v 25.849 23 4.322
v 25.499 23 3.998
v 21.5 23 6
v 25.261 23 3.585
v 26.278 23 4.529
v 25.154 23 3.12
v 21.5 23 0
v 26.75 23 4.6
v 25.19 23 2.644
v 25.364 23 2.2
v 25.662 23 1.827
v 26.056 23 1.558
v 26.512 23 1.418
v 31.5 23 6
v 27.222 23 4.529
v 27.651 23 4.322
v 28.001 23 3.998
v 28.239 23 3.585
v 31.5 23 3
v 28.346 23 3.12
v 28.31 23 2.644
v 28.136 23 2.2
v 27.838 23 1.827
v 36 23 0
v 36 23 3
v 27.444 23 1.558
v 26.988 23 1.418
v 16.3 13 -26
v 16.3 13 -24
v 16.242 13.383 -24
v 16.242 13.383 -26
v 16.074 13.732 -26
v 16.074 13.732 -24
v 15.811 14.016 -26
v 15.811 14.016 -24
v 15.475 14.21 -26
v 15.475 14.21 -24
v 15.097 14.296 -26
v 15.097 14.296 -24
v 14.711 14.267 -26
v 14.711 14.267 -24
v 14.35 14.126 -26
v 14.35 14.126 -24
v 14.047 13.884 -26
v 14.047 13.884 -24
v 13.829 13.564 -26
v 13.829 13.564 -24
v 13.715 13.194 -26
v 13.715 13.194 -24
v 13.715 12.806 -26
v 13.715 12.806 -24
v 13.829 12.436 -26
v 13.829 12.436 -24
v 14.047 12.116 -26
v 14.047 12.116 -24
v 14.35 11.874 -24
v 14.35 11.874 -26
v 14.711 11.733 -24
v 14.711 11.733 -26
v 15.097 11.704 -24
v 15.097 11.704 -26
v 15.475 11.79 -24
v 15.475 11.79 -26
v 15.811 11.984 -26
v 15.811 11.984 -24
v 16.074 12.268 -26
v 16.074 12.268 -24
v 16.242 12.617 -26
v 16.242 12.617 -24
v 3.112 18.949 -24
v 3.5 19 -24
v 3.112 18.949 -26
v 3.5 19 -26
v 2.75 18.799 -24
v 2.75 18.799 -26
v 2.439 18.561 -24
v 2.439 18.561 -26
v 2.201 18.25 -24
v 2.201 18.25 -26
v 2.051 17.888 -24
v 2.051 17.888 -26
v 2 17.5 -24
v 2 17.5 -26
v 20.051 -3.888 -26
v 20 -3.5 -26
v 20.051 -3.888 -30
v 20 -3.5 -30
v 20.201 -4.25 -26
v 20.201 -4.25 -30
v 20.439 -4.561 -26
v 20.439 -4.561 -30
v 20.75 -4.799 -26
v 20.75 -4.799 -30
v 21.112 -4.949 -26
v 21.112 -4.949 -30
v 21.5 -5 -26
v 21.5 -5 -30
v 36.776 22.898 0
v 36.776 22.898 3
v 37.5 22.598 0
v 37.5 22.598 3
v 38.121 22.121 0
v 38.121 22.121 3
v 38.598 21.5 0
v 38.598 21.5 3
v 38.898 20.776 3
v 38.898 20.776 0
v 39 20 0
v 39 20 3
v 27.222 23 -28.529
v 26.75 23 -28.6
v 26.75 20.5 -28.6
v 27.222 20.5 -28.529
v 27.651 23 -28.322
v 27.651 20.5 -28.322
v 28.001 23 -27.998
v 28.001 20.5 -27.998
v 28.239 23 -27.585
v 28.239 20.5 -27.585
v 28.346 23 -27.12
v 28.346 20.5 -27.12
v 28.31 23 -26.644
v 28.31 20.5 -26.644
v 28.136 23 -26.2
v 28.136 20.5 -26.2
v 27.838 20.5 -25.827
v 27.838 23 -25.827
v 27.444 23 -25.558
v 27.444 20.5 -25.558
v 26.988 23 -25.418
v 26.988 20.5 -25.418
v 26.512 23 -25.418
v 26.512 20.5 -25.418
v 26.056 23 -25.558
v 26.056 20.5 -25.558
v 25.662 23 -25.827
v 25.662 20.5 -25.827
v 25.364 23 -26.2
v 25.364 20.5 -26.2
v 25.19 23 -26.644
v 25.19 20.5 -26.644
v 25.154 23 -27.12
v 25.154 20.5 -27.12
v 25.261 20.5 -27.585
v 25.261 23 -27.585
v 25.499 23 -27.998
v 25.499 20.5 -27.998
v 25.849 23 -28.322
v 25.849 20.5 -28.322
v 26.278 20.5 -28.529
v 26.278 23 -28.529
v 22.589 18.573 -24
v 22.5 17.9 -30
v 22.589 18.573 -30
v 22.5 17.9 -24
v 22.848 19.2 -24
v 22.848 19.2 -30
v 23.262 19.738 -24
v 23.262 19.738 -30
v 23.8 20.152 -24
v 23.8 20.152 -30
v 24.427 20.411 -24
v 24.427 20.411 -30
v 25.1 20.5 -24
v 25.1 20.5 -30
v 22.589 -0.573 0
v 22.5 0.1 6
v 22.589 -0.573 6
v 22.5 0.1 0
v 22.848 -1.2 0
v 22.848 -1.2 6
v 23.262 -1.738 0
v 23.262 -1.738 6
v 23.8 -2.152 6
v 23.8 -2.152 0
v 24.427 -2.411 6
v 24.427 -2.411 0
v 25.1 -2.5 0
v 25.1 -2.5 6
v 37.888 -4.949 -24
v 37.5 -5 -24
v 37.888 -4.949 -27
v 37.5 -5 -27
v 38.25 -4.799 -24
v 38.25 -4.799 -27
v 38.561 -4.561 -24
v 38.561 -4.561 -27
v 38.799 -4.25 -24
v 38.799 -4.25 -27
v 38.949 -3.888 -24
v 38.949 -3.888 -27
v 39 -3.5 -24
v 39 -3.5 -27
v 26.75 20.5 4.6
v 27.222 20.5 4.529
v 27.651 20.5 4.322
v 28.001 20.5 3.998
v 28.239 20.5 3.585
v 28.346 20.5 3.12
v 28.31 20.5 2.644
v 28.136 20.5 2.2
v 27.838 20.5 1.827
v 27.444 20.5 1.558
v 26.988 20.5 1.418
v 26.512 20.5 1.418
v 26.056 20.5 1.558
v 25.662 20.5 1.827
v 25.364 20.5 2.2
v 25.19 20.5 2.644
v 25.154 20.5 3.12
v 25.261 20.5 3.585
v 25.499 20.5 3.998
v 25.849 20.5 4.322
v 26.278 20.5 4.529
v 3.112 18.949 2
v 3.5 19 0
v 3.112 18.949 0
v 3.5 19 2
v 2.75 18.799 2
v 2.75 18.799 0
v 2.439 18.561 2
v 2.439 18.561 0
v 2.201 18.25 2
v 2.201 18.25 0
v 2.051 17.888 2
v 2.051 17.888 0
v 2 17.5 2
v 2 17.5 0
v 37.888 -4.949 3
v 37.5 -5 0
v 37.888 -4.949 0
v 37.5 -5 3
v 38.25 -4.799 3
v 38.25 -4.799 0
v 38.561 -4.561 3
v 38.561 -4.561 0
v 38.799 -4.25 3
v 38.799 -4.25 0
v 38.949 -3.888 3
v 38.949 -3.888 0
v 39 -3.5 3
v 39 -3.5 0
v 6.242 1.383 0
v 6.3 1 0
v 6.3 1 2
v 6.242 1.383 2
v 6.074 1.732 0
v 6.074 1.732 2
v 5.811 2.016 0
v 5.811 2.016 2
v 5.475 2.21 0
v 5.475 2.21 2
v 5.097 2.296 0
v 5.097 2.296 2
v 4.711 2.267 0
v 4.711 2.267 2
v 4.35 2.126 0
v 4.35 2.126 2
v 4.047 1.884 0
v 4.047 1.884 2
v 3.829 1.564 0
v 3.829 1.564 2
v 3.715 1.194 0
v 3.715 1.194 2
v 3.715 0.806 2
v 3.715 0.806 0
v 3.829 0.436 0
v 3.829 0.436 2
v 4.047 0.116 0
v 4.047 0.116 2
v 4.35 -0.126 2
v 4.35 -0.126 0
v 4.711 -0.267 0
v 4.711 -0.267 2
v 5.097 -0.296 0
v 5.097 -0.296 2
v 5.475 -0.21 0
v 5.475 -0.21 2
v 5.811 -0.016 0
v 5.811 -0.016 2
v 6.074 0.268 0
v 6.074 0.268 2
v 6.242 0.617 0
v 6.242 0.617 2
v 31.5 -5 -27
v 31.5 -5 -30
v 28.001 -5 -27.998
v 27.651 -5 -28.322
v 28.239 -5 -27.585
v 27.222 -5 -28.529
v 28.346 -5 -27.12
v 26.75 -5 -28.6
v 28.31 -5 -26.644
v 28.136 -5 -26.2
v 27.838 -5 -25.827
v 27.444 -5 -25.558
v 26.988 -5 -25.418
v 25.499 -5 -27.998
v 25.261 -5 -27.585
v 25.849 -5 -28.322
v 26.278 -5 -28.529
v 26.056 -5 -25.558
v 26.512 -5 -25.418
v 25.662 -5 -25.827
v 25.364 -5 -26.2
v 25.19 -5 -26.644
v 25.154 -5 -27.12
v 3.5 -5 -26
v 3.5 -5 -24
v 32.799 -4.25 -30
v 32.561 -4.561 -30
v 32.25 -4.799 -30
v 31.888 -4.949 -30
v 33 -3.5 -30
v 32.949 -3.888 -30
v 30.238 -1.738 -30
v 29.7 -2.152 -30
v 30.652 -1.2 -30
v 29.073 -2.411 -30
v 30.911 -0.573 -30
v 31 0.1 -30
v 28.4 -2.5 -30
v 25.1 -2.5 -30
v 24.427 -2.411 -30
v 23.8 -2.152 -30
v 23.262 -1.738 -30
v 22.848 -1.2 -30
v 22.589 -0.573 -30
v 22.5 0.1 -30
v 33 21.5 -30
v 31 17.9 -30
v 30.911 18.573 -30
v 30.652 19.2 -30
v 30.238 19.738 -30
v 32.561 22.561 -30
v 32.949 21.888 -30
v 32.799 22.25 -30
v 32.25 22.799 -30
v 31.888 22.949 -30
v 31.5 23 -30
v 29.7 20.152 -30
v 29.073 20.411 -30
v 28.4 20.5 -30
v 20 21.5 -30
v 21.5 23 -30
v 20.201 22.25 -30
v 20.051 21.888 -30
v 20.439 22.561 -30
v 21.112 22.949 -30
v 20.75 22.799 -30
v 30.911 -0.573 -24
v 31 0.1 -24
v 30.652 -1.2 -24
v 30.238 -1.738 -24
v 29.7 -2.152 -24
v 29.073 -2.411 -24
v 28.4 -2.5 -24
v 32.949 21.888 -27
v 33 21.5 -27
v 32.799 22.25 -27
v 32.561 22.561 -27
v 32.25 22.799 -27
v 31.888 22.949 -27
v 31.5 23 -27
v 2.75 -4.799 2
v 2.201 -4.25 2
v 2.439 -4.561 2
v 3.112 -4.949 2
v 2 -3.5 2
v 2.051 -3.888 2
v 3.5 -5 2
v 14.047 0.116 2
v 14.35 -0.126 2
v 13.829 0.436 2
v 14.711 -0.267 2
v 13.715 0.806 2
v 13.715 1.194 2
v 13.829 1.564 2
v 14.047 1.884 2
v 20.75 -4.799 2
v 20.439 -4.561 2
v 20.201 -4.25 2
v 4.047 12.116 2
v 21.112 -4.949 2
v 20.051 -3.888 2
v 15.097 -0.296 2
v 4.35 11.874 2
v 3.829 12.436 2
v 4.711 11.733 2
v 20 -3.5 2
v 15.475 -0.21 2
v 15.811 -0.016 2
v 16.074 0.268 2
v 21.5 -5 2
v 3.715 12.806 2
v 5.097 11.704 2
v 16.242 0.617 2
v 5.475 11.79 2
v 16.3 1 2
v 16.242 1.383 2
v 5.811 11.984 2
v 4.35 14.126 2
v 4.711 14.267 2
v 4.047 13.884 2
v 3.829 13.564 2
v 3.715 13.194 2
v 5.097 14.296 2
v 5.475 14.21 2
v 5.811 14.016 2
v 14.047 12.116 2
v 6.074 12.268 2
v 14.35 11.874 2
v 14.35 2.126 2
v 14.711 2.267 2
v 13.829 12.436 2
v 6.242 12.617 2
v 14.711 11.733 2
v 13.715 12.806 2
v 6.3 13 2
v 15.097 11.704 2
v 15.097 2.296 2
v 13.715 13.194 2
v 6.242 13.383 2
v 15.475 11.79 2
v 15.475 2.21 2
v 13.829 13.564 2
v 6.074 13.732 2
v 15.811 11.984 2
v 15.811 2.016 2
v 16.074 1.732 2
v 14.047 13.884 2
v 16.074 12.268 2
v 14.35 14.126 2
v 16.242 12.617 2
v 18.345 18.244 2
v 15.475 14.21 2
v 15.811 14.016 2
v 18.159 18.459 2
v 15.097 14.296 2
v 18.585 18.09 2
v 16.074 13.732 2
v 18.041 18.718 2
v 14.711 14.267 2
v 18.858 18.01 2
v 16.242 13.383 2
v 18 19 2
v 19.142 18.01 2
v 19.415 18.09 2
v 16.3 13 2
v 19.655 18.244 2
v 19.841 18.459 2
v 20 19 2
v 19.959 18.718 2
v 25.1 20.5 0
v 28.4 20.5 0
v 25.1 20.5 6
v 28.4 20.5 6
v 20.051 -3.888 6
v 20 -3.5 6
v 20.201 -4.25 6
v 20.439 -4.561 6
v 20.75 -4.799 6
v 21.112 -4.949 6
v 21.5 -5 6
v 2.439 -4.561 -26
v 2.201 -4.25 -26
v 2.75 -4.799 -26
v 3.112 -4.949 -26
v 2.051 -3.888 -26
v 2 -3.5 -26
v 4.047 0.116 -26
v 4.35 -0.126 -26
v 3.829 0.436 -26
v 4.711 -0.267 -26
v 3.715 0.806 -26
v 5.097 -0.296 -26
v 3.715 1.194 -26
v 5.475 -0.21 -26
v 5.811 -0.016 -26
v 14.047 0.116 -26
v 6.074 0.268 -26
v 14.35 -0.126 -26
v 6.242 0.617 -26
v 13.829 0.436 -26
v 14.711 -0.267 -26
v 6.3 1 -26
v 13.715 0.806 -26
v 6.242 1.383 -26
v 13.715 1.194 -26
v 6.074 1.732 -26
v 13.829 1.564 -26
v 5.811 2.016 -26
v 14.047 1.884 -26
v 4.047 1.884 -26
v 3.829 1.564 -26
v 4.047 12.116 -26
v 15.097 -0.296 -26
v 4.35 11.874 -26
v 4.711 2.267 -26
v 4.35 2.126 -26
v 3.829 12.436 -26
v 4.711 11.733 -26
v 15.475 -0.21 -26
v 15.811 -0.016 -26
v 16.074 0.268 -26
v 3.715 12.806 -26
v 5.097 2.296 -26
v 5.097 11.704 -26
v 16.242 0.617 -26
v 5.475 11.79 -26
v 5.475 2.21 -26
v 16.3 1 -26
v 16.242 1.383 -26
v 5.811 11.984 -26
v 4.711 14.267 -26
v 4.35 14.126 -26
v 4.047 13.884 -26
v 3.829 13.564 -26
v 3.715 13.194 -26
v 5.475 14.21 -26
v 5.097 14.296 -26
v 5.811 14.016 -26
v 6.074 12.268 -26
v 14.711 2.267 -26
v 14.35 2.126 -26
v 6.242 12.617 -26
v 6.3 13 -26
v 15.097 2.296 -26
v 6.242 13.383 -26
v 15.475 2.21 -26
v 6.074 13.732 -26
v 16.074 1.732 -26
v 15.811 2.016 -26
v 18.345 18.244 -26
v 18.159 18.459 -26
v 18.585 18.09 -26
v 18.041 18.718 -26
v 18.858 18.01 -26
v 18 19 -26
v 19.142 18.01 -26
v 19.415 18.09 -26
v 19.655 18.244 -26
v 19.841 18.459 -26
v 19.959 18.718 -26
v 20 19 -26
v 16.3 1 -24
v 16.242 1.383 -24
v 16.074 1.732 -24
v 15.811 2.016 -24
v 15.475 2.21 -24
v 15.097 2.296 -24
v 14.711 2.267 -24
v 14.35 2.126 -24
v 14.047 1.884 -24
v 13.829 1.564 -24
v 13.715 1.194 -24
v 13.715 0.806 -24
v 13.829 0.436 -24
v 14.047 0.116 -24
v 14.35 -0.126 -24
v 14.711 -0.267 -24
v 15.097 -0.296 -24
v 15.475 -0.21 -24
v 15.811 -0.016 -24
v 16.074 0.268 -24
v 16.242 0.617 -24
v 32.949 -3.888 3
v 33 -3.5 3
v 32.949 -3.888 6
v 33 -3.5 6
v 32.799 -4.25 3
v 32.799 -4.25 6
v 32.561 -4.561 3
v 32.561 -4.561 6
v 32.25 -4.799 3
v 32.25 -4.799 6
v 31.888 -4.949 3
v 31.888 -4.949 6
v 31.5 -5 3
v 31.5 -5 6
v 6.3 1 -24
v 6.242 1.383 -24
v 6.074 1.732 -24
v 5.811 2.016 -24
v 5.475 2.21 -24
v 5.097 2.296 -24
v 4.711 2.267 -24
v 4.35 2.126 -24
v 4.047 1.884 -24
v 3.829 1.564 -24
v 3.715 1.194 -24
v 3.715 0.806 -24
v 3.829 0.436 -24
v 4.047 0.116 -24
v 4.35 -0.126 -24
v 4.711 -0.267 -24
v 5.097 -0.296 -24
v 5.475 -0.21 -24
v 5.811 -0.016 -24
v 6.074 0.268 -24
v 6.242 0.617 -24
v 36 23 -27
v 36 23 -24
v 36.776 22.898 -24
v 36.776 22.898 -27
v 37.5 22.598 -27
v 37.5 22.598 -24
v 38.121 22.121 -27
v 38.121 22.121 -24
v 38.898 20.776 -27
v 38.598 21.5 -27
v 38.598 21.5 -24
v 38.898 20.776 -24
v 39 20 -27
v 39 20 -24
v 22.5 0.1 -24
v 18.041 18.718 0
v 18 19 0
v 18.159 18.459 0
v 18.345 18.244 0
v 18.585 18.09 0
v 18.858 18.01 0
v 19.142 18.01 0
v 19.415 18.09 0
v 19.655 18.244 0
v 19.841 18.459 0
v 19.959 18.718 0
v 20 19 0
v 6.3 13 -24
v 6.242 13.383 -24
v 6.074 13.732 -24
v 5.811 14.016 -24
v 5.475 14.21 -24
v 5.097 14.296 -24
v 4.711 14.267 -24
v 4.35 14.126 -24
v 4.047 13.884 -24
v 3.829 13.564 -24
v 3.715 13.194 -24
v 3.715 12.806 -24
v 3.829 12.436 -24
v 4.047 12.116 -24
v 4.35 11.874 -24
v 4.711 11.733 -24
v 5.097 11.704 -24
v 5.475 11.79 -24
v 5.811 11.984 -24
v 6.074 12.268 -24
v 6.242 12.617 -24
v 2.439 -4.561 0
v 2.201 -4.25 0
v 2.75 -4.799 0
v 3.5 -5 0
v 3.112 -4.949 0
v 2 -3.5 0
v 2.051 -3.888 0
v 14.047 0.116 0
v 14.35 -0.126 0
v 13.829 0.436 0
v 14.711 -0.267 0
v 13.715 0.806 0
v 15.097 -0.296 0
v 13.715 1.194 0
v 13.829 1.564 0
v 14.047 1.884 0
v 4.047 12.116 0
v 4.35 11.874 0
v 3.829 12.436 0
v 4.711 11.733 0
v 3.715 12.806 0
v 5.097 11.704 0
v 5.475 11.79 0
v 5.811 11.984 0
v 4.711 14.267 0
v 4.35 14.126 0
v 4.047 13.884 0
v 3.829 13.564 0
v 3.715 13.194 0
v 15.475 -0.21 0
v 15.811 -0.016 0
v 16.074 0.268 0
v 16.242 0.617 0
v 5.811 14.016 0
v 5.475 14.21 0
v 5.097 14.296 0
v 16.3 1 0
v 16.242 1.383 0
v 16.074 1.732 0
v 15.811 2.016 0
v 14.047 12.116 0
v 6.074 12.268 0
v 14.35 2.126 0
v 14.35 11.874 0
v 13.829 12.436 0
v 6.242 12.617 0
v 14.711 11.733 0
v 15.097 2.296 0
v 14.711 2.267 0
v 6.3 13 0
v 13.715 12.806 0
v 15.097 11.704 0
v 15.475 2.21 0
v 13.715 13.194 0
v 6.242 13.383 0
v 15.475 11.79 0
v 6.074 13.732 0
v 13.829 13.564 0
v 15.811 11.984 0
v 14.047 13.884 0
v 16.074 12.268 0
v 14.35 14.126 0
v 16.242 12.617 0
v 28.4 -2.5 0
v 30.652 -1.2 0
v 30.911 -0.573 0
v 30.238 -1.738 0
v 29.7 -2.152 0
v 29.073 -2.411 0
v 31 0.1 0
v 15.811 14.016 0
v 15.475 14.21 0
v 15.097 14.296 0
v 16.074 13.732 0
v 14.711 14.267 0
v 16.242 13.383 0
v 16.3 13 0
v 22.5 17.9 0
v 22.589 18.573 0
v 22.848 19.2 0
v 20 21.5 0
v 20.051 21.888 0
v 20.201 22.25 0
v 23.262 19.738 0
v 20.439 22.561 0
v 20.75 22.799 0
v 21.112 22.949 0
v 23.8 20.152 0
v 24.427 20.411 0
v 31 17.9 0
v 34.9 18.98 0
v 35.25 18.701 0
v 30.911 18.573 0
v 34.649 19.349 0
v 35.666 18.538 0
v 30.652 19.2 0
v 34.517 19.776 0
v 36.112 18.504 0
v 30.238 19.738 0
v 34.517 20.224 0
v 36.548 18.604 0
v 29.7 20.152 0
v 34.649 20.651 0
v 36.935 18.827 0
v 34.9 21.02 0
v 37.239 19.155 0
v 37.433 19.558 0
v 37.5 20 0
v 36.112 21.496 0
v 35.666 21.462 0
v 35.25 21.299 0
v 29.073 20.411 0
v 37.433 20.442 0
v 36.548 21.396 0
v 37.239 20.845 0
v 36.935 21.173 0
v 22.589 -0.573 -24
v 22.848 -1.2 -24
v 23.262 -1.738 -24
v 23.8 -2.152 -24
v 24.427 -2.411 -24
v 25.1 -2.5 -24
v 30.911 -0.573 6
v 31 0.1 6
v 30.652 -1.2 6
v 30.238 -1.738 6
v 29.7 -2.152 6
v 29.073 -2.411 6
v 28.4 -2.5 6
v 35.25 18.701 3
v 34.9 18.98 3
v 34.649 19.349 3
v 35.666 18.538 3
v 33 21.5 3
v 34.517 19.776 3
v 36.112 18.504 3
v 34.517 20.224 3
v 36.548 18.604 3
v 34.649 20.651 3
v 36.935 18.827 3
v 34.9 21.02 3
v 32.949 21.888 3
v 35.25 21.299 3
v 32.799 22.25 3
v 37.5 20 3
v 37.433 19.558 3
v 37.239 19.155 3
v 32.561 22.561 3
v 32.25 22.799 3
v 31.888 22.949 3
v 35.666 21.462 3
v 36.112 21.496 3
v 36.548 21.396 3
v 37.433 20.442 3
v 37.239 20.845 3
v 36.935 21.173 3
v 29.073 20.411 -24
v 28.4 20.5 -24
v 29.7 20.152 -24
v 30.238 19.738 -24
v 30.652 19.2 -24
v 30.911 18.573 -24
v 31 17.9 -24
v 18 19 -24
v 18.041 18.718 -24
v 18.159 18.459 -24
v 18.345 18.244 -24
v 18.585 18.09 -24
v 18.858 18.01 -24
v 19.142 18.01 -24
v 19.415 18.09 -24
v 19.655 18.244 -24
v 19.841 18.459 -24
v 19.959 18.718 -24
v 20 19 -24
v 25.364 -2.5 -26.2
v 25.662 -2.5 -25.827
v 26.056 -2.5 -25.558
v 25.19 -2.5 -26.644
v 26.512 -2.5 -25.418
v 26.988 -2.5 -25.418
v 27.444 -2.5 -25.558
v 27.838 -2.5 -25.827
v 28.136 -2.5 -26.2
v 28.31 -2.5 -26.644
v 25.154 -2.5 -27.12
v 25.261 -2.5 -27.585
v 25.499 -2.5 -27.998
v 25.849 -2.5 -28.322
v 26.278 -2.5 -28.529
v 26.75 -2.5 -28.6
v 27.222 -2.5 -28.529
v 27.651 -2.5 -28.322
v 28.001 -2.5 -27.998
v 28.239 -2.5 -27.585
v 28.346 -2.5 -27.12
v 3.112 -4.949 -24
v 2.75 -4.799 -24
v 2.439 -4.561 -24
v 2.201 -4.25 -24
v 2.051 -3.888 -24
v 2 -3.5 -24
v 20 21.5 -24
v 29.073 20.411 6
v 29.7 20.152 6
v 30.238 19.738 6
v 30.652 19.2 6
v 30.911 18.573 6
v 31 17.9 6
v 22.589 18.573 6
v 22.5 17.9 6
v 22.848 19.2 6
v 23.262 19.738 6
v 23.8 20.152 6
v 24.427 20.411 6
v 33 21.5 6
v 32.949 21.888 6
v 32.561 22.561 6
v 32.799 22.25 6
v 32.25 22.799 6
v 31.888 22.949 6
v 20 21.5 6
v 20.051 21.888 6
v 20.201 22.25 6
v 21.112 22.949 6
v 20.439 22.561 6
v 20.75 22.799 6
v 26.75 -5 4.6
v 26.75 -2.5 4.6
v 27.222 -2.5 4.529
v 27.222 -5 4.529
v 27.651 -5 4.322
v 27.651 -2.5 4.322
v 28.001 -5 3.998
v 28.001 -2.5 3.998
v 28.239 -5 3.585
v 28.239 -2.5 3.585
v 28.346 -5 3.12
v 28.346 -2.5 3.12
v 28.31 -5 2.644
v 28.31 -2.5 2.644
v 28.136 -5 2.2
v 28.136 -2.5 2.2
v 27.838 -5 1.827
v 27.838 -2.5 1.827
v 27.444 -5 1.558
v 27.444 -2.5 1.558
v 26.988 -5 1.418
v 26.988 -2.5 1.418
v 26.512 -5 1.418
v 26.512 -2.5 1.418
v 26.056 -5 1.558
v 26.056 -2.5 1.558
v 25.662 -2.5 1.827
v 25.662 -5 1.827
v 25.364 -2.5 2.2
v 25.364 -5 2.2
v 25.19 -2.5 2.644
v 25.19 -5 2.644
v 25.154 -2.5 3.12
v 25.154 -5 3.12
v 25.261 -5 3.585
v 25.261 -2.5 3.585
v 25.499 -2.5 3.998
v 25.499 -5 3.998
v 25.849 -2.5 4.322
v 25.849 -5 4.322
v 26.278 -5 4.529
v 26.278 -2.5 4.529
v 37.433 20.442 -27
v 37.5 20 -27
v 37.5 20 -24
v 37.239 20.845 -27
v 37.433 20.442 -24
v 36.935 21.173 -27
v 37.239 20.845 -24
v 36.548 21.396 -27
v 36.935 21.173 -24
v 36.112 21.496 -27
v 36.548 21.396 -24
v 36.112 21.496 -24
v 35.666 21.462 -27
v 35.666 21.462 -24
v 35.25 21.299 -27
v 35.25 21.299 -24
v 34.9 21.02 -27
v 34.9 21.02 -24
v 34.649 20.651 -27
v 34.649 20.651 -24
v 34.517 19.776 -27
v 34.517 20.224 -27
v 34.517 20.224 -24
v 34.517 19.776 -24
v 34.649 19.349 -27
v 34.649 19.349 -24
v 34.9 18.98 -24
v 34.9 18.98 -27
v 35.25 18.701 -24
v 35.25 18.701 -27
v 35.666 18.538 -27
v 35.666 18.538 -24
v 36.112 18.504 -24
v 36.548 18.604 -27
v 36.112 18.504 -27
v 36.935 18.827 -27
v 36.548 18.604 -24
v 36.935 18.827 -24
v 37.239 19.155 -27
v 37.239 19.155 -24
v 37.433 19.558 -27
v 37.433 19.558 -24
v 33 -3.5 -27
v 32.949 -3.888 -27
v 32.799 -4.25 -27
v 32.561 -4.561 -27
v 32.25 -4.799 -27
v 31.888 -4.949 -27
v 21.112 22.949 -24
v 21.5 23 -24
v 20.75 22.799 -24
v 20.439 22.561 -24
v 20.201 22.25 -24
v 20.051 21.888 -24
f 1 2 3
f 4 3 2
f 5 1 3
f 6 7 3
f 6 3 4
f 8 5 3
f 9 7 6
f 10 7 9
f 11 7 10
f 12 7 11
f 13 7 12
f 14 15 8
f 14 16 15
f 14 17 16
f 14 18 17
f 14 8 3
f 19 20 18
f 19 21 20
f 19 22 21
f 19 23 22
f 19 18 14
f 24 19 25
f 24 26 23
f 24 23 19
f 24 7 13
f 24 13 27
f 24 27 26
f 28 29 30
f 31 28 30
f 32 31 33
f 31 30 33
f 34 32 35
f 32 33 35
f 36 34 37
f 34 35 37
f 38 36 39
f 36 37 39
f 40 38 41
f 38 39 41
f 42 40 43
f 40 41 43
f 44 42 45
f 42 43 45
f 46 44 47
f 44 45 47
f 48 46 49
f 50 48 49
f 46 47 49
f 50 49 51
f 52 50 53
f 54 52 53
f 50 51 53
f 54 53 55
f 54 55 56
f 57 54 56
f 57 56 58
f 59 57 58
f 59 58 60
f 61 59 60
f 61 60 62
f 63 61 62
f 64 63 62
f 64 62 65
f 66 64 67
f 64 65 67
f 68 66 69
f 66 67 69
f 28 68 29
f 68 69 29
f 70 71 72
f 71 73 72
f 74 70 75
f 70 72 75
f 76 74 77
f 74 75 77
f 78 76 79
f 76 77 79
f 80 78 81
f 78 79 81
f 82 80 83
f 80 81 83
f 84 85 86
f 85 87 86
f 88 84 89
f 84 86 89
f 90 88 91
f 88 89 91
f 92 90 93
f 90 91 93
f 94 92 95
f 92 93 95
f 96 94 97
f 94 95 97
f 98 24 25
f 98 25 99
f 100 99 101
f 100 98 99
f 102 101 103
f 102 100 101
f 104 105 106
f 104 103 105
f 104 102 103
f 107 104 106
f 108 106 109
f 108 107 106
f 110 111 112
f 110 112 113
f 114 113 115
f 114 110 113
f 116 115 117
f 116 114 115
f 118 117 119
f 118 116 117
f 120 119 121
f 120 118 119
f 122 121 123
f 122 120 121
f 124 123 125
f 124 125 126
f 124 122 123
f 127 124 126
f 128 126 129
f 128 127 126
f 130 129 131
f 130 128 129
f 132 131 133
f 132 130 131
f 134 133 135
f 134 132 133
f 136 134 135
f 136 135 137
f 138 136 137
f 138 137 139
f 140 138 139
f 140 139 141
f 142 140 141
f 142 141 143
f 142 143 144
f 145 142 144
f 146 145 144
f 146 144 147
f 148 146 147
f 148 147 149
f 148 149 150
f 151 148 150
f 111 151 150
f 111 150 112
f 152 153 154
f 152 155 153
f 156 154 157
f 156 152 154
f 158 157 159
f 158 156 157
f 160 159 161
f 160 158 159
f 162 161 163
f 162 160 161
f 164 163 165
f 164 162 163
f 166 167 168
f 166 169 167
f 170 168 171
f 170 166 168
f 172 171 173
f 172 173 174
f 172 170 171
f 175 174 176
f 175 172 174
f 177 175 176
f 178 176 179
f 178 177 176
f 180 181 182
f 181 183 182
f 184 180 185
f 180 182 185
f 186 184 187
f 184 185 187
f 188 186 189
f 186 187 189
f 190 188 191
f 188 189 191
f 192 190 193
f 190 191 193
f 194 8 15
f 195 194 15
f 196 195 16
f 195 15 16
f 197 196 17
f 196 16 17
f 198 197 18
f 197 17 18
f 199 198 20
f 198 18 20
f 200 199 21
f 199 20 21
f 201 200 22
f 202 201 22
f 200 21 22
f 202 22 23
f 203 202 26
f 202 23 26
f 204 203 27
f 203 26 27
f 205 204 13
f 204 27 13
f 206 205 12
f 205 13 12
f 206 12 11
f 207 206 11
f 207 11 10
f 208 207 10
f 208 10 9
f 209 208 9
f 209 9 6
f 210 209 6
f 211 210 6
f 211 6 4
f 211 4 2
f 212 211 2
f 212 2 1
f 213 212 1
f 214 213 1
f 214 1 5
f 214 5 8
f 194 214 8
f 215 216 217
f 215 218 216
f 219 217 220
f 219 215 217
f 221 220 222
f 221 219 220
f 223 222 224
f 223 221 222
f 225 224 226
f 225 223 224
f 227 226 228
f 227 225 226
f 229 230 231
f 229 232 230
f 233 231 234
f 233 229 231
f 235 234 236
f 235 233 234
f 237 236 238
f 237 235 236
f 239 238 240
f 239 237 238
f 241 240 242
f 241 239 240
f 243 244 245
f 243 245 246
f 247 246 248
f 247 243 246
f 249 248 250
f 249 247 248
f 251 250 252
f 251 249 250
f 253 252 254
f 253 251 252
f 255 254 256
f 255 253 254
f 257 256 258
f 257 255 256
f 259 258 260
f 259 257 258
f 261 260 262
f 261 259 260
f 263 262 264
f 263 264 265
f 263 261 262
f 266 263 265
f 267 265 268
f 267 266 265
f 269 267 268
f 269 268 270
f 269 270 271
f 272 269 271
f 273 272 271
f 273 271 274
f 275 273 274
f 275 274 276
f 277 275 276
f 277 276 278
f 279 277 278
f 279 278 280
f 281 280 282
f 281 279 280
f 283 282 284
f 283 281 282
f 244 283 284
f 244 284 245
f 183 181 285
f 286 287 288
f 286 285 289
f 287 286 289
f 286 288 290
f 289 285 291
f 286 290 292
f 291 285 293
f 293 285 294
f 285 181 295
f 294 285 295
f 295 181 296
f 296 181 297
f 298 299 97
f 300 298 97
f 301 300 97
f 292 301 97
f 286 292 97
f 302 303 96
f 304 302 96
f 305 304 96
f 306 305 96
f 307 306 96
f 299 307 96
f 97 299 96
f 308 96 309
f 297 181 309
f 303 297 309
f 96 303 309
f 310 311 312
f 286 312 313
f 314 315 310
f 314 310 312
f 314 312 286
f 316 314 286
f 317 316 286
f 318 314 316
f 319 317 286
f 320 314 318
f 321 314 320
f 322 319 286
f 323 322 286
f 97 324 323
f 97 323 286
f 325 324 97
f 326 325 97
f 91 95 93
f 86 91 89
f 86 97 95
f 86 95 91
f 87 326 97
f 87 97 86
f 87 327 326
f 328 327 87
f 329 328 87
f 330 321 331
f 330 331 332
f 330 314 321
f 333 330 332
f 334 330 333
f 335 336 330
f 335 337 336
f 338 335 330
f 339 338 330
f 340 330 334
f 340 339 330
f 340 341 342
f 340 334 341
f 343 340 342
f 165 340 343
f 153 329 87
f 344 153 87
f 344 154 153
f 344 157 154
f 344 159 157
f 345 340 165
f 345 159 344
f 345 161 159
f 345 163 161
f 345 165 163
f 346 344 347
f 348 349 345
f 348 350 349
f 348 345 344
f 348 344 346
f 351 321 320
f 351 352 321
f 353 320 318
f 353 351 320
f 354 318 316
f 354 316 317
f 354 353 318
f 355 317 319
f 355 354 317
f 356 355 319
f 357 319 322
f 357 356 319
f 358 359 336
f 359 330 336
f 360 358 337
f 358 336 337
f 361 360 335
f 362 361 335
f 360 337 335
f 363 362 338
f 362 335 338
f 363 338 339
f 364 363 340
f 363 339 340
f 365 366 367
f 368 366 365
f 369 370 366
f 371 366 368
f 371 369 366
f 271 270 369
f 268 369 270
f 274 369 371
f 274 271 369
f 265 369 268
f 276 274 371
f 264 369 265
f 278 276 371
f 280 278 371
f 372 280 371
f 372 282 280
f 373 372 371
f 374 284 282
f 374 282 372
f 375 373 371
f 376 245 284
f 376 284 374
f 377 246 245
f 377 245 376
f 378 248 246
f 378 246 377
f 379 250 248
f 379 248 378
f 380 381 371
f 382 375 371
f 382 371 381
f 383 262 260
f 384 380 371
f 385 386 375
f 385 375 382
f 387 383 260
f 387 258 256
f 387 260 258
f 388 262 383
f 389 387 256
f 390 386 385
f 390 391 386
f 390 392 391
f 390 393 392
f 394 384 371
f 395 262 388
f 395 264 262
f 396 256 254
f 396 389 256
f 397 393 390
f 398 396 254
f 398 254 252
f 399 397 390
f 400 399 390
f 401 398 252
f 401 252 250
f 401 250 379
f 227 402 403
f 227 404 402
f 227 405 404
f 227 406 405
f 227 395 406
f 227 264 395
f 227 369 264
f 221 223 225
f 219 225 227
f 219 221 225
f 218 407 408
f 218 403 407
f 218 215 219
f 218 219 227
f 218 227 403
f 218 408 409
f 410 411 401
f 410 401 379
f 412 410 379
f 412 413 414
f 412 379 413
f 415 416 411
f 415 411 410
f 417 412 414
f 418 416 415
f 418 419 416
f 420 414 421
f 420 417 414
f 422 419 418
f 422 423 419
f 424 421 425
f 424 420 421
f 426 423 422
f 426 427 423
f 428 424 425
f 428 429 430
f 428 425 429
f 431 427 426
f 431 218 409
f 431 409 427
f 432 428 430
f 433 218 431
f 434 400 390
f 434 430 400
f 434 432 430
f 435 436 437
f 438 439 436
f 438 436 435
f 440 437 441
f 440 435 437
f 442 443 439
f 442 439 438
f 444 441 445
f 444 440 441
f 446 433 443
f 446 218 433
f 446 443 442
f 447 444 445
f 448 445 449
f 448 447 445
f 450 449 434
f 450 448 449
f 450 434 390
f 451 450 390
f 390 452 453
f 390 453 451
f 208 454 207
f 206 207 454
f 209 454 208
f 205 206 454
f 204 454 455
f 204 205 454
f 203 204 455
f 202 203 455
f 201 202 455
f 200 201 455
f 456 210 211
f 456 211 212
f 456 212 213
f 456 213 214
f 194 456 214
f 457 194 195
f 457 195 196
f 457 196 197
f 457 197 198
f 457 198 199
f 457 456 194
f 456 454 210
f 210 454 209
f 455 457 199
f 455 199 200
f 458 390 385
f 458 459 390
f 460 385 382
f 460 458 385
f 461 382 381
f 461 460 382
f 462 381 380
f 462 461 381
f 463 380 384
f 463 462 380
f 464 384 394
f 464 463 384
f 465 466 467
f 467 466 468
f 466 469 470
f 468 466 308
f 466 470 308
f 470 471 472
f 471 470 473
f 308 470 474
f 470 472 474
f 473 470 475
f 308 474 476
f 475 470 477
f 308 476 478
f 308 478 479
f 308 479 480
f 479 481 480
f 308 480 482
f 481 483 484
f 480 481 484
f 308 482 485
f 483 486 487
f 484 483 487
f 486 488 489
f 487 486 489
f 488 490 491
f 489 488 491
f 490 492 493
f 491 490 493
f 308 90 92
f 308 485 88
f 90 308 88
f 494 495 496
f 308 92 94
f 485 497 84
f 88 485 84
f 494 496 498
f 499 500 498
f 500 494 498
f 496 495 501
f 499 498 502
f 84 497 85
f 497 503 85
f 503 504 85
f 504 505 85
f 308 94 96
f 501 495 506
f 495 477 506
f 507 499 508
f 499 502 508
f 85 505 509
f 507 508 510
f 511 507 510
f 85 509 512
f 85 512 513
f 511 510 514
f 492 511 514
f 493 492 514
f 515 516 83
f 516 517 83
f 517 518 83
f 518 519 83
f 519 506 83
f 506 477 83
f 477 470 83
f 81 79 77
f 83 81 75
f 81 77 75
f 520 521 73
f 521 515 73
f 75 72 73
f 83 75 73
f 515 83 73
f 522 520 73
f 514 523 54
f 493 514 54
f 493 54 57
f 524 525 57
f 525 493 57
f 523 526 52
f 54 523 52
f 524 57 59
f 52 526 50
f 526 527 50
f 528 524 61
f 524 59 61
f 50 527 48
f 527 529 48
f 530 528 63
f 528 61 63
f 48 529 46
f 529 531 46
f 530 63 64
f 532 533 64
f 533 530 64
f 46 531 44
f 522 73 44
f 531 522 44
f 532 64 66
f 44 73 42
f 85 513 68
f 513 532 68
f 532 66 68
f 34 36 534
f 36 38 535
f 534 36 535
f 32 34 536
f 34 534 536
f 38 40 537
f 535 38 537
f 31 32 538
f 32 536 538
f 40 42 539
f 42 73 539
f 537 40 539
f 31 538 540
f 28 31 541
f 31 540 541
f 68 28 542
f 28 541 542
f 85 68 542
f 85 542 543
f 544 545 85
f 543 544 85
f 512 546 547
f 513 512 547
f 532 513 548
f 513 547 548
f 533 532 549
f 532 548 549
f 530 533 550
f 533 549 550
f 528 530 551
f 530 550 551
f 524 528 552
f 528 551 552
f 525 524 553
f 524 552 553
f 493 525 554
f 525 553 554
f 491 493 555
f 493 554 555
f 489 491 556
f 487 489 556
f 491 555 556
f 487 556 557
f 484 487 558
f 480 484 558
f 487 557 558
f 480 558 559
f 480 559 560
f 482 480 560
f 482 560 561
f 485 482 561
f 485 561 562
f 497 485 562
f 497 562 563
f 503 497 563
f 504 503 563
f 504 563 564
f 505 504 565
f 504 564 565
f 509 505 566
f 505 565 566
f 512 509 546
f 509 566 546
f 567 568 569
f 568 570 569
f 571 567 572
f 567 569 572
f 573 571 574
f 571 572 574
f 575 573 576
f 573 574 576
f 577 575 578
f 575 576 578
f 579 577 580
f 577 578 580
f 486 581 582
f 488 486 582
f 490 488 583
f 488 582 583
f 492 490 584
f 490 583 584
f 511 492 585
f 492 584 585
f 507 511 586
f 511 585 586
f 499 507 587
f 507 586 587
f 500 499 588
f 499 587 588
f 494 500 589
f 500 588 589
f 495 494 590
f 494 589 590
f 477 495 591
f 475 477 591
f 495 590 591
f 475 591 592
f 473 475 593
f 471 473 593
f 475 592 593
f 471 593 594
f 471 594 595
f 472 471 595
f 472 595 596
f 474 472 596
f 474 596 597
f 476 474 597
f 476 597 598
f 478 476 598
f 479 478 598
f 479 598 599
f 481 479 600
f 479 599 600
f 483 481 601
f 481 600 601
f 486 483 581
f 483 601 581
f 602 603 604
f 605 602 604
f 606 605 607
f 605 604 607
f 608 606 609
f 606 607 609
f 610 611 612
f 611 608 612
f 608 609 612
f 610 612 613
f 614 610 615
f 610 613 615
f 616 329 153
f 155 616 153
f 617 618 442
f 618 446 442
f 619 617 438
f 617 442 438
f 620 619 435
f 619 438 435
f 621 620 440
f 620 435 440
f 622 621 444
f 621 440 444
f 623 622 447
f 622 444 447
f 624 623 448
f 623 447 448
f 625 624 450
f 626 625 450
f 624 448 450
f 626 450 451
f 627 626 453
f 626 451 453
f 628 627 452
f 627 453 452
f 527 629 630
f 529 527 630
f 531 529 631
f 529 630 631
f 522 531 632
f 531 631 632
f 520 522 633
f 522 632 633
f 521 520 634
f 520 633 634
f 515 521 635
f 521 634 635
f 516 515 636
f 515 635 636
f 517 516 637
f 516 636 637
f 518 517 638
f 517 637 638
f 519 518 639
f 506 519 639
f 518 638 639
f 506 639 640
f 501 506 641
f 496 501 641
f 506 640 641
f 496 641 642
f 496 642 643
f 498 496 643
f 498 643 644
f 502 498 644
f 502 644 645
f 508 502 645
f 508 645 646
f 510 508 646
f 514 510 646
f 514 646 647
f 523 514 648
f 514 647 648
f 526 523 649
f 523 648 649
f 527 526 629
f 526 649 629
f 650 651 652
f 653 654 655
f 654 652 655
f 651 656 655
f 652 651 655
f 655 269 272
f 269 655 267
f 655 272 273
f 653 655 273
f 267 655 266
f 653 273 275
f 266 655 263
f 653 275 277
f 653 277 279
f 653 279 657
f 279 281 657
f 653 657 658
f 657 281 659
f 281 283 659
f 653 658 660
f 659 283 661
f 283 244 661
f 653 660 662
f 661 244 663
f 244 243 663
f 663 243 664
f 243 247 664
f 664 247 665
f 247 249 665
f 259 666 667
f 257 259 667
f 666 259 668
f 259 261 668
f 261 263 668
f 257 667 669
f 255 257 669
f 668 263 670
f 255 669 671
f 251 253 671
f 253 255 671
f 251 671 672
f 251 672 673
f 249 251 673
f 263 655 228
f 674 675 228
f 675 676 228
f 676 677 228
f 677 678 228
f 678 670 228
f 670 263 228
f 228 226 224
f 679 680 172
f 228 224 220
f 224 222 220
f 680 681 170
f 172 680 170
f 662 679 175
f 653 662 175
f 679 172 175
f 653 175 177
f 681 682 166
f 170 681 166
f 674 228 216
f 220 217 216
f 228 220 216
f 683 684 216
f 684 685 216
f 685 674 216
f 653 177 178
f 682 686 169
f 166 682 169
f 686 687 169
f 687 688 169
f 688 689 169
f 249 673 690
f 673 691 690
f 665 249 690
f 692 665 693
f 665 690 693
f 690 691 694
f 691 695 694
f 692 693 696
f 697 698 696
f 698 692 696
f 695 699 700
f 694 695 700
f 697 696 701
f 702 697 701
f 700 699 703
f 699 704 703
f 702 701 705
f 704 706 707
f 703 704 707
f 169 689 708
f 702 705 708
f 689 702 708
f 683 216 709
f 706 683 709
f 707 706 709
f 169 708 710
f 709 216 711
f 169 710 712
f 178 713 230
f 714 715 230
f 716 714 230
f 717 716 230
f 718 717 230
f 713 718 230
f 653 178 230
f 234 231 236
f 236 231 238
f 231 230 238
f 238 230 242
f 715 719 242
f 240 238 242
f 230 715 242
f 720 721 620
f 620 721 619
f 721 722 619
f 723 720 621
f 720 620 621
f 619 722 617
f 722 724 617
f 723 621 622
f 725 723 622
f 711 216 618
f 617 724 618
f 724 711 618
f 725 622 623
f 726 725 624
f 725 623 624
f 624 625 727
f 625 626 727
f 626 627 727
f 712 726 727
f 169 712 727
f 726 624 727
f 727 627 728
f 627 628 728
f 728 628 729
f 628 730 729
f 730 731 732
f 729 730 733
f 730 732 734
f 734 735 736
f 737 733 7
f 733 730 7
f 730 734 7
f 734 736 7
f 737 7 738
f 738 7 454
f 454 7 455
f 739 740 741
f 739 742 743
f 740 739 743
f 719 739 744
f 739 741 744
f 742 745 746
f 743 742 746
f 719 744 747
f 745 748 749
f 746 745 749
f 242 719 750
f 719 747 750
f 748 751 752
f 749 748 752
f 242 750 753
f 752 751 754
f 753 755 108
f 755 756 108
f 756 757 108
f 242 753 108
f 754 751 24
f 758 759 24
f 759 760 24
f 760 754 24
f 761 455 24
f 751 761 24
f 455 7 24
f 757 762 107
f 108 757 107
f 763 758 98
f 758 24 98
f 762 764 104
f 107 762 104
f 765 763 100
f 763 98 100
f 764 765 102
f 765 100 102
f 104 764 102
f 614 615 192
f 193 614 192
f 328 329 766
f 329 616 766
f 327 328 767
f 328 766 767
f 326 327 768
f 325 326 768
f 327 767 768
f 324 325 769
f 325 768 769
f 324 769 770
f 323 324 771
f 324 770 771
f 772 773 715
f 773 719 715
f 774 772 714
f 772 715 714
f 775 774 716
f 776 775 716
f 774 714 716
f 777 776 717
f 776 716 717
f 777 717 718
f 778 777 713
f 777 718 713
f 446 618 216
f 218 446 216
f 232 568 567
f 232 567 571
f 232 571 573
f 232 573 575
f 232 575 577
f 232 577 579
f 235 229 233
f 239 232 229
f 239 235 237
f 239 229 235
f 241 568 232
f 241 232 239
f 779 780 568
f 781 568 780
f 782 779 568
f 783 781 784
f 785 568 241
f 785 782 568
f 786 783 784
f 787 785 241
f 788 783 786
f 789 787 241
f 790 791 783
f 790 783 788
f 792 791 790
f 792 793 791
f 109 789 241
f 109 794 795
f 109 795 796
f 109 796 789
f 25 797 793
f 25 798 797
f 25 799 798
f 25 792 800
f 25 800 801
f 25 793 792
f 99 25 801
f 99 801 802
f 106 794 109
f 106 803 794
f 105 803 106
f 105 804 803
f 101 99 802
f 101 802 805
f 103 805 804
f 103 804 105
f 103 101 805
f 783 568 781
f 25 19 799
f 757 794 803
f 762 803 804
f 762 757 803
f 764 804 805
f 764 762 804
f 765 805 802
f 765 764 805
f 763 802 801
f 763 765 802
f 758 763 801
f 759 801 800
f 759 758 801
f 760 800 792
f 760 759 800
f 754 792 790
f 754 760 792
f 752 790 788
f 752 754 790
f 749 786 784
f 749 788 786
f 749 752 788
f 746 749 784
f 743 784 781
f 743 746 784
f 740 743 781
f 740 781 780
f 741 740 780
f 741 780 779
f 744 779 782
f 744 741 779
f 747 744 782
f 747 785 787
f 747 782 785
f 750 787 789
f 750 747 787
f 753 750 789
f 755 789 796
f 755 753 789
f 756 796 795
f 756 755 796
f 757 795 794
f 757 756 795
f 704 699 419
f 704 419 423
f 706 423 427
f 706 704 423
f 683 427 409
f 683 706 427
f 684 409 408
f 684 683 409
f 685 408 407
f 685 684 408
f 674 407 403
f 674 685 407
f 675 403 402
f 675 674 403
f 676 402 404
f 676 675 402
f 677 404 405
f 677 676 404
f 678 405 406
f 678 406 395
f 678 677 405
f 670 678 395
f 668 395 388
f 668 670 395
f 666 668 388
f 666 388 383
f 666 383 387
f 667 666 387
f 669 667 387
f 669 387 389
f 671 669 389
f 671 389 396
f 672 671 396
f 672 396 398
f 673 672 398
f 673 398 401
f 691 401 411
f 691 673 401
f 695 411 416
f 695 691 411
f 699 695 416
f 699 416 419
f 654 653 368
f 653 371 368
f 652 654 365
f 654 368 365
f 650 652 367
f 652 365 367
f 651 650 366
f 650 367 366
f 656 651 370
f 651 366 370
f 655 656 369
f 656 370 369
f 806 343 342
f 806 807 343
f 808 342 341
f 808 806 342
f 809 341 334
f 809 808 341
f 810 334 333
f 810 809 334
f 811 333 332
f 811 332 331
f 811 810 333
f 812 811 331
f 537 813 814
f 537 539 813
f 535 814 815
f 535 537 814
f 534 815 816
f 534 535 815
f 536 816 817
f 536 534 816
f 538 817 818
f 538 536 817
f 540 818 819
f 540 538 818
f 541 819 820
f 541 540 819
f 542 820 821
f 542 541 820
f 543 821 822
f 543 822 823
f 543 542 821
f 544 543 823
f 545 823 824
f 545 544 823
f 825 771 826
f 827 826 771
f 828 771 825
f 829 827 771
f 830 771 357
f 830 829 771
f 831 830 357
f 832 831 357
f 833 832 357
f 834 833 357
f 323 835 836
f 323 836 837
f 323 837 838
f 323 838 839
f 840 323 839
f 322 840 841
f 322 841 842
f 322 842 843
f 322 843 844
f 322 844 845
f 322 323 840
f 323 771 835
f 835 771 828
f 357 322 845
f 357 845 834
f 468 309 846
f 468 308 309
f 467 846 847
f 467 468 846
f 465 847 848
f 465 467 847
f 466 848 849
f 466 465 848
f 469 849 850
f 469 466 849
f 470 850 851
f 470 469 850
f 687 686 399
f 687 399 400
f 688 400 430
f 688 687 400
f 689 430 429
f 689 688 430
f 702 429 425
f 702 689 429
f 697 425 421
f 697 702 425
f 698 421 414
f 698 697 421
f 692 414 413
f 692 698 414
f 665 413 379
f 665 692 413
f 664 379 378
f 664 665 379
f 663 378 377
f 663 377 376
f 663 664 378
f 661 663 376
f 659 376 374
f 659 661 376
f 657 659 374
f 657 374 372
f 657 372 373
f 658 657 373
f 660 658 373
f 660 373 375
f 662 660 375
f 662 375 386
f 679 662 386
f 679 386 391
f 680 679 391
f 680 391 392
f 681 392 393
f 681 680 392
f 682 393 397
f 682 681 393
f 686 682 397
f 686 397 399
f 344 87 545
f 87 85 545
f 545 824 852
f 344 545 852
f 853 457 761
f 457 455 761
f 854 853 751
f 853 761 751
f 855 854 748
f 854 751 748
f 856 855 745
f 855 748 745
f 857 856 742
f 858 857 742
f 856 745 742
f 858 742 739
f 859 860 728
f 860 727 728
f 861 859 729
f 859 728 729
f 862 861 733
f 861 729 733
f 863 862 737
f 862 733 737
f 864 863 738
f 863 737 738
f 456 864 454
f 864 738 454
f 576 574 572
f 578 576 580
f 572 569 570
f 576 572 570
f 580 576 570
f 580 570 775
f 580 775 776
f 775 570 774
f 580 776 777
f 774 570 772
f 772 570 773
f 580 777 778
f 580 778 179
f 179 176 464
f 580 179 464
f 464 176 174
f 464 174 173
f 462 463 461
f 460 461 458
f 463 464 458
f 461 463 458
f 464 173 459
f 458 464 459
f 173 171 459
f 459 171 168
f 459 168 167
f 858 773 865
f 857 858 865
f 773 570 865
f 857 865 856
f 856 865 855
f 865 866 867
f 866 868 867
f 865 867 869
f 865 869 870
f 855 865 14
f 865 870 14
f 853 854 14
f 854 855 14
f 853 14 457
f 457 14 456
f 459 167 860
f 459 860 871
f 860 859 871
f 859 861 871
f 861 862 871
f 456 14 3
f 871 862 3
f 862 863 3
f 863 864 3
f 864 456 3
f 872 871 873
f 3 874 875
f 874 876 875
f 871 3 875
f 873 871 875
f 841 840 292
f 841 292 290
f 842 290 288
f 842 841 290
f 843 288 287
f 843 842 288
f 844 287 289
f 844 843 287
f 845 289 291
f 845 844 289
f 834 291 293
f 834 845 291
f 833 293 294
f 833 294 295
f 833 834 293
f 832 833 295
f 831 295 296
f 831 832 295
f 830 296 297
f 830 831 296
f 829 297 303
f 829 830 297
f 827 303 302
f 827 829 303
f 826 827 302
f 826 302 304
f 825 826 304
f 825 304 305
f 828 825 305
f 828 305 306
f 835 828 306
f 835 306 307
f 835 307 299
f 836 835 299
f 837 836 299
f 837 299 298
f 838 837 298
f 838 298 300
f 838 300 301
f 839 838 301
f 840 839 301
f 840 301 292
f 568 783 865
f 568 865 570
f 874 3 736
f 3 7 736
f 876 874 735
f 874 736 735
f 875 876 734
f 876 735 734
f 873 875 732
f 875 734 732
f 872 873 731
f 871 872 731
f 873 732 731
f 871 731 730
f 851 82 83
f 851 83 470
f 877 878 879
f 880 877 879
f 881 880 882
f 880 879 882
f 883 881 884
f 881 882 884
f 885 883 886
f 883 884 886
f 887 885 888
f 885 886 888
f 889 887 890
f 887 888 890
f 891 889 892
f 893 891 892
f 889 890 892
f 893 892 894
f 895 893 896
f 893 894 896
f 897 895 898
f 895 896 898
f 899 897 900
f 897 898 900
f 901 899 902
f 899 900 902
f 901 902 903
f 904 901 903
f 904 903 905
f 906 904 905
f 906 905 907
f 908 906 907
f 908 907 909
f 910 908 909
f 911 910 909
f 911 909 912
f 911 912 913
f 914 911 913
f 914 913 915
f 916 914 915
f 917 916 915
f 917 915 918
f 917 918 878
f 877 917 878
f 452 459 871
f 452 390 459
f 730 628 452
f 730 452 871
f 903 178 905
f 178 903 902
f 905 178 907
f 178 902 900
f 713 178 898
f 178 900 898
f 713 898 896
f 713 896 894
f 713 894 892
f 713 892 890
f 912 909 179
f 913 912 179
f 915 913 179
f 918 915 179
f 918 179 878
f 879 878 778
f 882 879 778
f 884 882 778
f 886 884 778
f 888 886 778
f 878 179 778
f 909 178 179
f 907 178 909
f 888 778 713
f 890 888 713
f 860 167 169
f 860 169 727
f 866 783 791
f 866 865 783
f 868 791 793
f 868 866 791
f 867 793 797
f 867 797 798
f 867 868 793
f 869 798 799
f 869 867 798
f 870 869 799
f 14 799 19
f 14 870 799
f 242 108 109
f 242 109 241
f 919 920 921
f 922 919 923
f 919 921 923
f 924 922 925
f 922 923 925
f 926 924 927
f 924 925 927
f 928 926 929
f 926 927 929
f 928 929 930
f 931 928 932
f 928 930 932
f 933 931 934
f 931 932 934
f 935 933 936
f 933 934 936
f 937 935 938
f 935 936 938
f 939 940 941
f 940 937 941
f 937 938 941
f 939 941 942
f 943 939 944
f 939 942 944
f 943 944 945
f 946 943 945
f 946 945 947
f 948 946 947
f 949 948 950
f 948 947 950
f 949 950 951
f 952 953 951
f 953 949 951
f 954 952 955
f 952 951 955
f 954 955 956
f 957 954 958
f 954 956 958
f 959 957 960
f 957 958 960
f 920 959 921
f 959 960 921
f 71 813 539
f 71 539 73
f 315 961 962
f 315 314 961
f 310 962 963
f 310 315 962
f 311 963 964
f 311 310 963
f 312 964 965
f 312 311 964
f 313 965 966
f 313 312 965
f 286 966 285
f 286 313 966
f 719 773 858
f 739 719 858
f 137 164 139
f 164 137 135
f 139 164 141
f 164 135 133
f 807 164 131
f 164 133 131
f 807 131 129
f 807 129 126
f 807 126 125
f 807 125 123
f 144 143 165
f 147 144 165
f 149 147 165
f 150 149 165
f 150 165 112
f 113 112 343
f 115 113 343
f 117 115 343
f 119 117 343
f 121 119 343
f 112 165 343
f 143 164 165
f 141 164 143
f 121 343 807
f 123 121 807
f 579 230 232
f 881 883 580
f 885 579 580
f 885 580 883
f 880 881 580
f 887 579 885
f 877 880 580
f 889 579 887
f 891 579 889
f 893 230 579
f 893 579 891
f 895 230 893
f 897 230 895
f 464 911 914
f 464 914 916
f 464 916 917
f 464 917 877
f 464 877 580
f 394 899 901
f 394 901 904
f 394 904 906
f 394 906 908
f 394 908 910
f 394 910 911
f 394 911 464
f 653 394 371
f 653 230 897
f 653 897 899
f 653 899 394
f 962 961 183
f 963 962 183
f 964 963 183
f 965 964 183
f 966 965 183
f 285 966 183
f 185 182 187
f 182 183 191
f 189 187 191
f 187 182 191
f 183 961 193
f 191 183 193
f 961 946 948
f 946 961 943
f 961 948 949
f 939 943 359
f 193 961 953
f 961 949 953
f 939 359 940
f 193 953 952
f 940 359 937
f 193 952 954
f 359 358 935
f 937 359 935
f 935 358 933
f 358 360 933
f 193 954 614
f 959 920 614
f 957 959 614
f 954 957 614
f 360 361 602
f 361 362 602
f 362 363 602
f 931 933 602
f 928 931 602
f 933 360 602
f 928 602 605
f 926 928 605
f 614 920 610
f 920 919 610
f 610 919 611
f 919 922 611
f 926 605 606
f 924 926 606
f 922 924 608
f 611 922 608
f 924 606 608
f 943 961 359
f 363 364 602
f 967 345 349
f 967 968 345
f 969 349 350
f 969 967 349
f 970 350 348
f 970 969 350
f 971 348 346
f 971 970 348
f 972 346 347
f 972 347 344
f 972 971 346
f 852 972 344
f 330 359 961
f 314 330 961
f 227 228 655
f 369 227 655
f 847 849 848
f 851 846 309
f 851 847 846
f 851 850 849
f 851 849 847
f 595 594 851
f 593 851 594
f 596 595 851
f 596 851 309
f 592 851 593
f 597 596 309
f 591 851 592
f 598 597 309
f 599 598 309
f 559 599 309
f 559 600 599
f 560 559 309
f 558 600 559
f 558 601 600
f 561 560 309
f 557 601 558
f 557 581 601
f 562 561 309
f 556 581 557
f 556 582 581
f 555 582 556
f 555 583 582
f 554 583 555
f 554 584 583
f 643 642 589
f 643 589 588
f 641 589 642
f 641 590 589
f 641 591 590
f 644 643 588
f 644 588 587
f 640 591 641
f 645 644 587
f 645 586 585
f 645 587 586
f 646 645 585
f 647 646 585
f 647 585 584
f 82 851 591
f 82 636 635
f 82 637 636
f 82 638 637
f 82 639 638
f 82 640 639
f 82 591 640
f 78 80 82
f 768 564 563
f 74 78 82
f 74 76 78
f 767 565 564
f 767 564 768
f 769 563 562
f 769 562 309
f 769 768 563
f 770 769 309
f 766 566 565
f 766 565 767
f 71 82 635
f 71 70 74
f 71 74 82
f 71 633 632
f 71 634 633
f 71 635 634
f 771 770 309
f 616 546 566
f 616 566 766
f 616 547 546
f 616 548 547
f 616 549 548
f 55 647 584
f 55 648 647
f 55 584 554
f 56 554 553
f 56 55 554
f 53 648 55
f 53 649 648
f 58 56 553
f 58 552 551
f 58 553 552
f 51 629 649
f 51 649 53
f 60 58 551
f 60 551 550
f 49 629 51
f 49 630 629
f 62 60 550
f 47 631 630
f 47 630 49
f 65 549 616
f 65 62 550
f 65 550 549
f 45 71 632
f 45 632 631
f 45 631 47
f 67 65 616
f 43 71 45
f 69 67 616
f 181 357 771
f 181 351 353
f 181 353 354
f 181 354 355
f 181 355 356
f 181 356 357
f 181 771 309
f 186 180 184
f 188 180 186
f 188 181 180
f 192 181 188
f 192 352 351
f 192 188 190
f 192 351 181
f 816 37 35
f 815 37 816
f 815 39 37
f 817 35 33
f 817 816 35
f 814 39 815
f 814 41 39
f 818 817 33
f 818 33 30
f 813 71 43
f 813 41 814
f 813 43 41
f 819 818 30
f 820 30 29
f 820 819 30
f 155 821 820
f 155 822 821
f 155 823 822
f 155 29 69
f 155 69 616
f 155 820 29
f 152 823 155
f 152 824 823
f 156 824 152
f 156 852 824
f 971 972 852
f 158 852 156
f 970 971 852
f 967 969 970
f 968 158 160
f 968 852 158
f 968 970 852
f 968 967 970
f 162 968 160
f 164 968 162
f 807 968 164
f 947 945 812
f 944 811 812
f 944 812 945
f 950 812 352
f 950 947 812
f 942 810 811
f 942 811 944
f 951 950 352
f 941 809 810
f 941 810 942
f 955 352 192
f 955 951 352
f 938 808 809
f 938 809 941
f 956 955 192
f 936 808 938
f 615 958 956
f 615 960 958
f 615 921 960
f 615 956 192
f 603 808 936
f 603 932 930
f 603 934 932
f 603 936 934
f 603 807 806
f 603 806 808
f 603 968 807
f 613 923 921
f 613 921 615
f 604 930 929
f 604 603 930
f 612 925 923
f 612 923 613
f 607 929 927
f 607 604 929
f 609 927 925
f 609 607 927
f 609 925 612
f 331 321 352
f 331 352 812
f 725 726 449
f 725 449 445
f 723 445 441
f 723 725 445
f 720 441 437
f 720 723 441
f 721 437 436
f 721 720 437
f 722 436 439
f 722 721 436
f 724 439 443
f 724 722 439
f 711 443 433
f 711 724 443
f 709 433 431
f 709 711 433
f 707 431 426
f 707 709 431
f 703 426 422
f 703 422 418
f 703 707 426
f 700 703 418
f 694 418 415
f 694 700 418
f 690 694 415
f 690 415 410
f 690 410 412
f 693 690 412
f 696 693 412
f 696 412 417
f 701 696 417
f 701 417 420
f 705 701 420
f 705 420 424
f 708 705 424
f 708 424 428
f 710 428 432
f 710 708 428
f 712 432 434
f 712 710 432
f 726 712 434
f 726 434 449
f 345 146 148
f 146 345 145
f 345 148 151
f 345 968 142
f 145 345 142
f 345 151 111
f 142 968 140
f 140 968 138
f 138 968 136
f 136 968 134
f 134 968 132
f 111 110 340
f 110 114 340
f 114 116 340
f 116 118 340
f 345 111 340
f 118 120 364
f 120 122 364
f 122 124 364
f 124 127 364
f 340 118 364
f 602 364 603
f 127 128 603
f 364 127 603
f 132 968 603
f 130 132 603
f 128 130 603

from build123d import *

# Parameters (mm, degrees)
SKETCH_3_R          = 1.5
SKETCH_3_R_2        = 1.3
EXTRUDE_1_DEPTH     = 2
SKETCH_4_R          = 1.5
EXTRUDE_2_DEPTH     = 4
SKETCH_5_R          = 1.6
CUT_EXTRUDE_1_DEPTH = 34
SKETCH_6_W          = 8.5
SKETCH_6_H          = 23
CUT_EXTRUDE_2_DEPTH = 34
FILLET_1_R          = 2.6
CUT_EXTRUDE_START   = -3
CUT_EXTRUDE_3_DEPTH = 3
FILLET_2_R          = 1.5
SKETCH_10_R         = 1
CUT_EXTRUDE_4_DEPTH = 4


with BuildPart() as part:
    # 草图3 → 凸台-拉伸1 (new body)
    with BuildSketch(Plane.XY):
        with BuildLine():
            Line((2, 19), (2, -5))
            Line((2, -5), (20, -5))
            Line((20, -5), (39, -5))
            Line((39, -5), (39, 20))
            ThreePointArc((39, 20), (38.121320344, 22.121320344), (36, 23))
            Line((36, 23), (20, 23))
            Line((20, 23), (20, 19))
            Line((20, 19), (2, 19))
        make_face()
        with Locations((36, 20)):
            Circle(SKETCH_3_R, mode=Mode.SUBTRACT)
        with Locations((15, 13)):
            Circle(SKETCH_3_R_2, mode=Mode.SUBTRACT)
        with Locations((5, 13)):
            Circle(SKETCH_3_R_2, mode=Mode.SUBTRACT)
        with Locations((5, 1)):
            Circle(SKETCH_3_R_2, mode=Mode.SUBTRACT)
        with Locations((15, 1)):
            Circle(SKETCH_3_R_2, mode=Mode.SUBTRACT)
    extrude(amount=EXTRUDE_1_DEPTH)

    # 草图4 → 凸台-拉伸2 (add)
    with BuildSketch(Plane.XY.offset(2)):
        with BuildLine():
            Line((39, -5), (20, -5))
            Line((20, -5), (20, 23))
            Line((20, 23), (36, 23))
            ThreePointArc((36, 23), (38.121320344, 22.121320344), (39, 20))
            Line((39, 20), (39, -5))
        make_face()
        with Locations((36, 20)):
            Circle(SKETCH_4_R, mode=Mode.SUBTRACT)
    extrude(amount=EXTRUDE_2_DEPTH)

    # 草图5 → 切除-拉伸1 (cut)
    with BuildSketch(Plane(origin=(0, 23, 0), x_dir=(1, 0, 0), z_dir=(0, 1, 0))):
        with Locations(Location((26.75, -3, 0), (0, 0, 270))):
            Circle(SKETCH_5_R)
    extrude(amount=-CUT_EXTRUDE_1_DEPTH, mode=Mode.SUBTRACT)

    # 草图6 → 切除-拉伸2 (cut)
    with BuildSketch(Plane.XY.offset(6)):
        with Locations((26.75, 9)):
            Rectangle(SKETCH_6_W, SKETCH_6_H)
    extrude(amount=-CUT_EXTRUDE_2_DEPTH, mode=Mode.SUBTRACT)

    # 圆角1
    fillet_1_edges = [part.edges().sort_by_distance(p)[0] for p in [
        (22.5, 20.5, 3),
        (31, -2.5, 3),
        (22.5, -2.5, 3),
        (31, 20.5, 3),
    ]]
    fillet(fillet_1_edges, radius=FILLET_1_R)

    # 草图7 → 切除-拉伸3 (cut)
    with BuildSketch(Plane.XY.offset(6).offset(CUT_EXTRUDE_START)):
        with BuildLine():
            Line((33, 23), (33, -5))
            Line((33, -5), (39, -5))
            Line((39, -5), (39, 20))
            ThreePointArc((39, 20), (38.121320344, 22.121320344), (36, 23))
            Line((36, 23), (33, 23))
        make_face()
    extrude(amount=CUT_EXTRUDE_3_DEPTH, mode=Mode.SUBTRACT)

    # 圆角2
    fillet_2_edges = [part.edges().sort_by_distance(p)[0] for p in [
        (39, -5, 1.5),
        (33, 23, 4.5),
        (33, -5, 4.5),
        (20, 23, 3),
        (2, -5, 1),
        (2, 19, 1),
        (20, -5, 4),
    ]]
    fillet(fillet_2_edges, radius=FILLET_2_R)

    # 草图10 → 切除-拉伸4 (cut)
    with BuildSketch(Plane.XY.offset(2)):
        with Locations((19, 19)):
            Circle(SKETCH_10_R)
    extrude(amount=-CUT_EXTRUDE_4_DEPTH, mode=Mode.SUBTRACT)


with BuildPart() as body_2:
    # 镜向1: mirrored copy
    add(part.part.mirror(Plane(origin=(0, 0, -12), x_dir=(1, 0, 0), z_dir=(0, 0, -1))))


solid = Compound([part.part, body_2.part])
